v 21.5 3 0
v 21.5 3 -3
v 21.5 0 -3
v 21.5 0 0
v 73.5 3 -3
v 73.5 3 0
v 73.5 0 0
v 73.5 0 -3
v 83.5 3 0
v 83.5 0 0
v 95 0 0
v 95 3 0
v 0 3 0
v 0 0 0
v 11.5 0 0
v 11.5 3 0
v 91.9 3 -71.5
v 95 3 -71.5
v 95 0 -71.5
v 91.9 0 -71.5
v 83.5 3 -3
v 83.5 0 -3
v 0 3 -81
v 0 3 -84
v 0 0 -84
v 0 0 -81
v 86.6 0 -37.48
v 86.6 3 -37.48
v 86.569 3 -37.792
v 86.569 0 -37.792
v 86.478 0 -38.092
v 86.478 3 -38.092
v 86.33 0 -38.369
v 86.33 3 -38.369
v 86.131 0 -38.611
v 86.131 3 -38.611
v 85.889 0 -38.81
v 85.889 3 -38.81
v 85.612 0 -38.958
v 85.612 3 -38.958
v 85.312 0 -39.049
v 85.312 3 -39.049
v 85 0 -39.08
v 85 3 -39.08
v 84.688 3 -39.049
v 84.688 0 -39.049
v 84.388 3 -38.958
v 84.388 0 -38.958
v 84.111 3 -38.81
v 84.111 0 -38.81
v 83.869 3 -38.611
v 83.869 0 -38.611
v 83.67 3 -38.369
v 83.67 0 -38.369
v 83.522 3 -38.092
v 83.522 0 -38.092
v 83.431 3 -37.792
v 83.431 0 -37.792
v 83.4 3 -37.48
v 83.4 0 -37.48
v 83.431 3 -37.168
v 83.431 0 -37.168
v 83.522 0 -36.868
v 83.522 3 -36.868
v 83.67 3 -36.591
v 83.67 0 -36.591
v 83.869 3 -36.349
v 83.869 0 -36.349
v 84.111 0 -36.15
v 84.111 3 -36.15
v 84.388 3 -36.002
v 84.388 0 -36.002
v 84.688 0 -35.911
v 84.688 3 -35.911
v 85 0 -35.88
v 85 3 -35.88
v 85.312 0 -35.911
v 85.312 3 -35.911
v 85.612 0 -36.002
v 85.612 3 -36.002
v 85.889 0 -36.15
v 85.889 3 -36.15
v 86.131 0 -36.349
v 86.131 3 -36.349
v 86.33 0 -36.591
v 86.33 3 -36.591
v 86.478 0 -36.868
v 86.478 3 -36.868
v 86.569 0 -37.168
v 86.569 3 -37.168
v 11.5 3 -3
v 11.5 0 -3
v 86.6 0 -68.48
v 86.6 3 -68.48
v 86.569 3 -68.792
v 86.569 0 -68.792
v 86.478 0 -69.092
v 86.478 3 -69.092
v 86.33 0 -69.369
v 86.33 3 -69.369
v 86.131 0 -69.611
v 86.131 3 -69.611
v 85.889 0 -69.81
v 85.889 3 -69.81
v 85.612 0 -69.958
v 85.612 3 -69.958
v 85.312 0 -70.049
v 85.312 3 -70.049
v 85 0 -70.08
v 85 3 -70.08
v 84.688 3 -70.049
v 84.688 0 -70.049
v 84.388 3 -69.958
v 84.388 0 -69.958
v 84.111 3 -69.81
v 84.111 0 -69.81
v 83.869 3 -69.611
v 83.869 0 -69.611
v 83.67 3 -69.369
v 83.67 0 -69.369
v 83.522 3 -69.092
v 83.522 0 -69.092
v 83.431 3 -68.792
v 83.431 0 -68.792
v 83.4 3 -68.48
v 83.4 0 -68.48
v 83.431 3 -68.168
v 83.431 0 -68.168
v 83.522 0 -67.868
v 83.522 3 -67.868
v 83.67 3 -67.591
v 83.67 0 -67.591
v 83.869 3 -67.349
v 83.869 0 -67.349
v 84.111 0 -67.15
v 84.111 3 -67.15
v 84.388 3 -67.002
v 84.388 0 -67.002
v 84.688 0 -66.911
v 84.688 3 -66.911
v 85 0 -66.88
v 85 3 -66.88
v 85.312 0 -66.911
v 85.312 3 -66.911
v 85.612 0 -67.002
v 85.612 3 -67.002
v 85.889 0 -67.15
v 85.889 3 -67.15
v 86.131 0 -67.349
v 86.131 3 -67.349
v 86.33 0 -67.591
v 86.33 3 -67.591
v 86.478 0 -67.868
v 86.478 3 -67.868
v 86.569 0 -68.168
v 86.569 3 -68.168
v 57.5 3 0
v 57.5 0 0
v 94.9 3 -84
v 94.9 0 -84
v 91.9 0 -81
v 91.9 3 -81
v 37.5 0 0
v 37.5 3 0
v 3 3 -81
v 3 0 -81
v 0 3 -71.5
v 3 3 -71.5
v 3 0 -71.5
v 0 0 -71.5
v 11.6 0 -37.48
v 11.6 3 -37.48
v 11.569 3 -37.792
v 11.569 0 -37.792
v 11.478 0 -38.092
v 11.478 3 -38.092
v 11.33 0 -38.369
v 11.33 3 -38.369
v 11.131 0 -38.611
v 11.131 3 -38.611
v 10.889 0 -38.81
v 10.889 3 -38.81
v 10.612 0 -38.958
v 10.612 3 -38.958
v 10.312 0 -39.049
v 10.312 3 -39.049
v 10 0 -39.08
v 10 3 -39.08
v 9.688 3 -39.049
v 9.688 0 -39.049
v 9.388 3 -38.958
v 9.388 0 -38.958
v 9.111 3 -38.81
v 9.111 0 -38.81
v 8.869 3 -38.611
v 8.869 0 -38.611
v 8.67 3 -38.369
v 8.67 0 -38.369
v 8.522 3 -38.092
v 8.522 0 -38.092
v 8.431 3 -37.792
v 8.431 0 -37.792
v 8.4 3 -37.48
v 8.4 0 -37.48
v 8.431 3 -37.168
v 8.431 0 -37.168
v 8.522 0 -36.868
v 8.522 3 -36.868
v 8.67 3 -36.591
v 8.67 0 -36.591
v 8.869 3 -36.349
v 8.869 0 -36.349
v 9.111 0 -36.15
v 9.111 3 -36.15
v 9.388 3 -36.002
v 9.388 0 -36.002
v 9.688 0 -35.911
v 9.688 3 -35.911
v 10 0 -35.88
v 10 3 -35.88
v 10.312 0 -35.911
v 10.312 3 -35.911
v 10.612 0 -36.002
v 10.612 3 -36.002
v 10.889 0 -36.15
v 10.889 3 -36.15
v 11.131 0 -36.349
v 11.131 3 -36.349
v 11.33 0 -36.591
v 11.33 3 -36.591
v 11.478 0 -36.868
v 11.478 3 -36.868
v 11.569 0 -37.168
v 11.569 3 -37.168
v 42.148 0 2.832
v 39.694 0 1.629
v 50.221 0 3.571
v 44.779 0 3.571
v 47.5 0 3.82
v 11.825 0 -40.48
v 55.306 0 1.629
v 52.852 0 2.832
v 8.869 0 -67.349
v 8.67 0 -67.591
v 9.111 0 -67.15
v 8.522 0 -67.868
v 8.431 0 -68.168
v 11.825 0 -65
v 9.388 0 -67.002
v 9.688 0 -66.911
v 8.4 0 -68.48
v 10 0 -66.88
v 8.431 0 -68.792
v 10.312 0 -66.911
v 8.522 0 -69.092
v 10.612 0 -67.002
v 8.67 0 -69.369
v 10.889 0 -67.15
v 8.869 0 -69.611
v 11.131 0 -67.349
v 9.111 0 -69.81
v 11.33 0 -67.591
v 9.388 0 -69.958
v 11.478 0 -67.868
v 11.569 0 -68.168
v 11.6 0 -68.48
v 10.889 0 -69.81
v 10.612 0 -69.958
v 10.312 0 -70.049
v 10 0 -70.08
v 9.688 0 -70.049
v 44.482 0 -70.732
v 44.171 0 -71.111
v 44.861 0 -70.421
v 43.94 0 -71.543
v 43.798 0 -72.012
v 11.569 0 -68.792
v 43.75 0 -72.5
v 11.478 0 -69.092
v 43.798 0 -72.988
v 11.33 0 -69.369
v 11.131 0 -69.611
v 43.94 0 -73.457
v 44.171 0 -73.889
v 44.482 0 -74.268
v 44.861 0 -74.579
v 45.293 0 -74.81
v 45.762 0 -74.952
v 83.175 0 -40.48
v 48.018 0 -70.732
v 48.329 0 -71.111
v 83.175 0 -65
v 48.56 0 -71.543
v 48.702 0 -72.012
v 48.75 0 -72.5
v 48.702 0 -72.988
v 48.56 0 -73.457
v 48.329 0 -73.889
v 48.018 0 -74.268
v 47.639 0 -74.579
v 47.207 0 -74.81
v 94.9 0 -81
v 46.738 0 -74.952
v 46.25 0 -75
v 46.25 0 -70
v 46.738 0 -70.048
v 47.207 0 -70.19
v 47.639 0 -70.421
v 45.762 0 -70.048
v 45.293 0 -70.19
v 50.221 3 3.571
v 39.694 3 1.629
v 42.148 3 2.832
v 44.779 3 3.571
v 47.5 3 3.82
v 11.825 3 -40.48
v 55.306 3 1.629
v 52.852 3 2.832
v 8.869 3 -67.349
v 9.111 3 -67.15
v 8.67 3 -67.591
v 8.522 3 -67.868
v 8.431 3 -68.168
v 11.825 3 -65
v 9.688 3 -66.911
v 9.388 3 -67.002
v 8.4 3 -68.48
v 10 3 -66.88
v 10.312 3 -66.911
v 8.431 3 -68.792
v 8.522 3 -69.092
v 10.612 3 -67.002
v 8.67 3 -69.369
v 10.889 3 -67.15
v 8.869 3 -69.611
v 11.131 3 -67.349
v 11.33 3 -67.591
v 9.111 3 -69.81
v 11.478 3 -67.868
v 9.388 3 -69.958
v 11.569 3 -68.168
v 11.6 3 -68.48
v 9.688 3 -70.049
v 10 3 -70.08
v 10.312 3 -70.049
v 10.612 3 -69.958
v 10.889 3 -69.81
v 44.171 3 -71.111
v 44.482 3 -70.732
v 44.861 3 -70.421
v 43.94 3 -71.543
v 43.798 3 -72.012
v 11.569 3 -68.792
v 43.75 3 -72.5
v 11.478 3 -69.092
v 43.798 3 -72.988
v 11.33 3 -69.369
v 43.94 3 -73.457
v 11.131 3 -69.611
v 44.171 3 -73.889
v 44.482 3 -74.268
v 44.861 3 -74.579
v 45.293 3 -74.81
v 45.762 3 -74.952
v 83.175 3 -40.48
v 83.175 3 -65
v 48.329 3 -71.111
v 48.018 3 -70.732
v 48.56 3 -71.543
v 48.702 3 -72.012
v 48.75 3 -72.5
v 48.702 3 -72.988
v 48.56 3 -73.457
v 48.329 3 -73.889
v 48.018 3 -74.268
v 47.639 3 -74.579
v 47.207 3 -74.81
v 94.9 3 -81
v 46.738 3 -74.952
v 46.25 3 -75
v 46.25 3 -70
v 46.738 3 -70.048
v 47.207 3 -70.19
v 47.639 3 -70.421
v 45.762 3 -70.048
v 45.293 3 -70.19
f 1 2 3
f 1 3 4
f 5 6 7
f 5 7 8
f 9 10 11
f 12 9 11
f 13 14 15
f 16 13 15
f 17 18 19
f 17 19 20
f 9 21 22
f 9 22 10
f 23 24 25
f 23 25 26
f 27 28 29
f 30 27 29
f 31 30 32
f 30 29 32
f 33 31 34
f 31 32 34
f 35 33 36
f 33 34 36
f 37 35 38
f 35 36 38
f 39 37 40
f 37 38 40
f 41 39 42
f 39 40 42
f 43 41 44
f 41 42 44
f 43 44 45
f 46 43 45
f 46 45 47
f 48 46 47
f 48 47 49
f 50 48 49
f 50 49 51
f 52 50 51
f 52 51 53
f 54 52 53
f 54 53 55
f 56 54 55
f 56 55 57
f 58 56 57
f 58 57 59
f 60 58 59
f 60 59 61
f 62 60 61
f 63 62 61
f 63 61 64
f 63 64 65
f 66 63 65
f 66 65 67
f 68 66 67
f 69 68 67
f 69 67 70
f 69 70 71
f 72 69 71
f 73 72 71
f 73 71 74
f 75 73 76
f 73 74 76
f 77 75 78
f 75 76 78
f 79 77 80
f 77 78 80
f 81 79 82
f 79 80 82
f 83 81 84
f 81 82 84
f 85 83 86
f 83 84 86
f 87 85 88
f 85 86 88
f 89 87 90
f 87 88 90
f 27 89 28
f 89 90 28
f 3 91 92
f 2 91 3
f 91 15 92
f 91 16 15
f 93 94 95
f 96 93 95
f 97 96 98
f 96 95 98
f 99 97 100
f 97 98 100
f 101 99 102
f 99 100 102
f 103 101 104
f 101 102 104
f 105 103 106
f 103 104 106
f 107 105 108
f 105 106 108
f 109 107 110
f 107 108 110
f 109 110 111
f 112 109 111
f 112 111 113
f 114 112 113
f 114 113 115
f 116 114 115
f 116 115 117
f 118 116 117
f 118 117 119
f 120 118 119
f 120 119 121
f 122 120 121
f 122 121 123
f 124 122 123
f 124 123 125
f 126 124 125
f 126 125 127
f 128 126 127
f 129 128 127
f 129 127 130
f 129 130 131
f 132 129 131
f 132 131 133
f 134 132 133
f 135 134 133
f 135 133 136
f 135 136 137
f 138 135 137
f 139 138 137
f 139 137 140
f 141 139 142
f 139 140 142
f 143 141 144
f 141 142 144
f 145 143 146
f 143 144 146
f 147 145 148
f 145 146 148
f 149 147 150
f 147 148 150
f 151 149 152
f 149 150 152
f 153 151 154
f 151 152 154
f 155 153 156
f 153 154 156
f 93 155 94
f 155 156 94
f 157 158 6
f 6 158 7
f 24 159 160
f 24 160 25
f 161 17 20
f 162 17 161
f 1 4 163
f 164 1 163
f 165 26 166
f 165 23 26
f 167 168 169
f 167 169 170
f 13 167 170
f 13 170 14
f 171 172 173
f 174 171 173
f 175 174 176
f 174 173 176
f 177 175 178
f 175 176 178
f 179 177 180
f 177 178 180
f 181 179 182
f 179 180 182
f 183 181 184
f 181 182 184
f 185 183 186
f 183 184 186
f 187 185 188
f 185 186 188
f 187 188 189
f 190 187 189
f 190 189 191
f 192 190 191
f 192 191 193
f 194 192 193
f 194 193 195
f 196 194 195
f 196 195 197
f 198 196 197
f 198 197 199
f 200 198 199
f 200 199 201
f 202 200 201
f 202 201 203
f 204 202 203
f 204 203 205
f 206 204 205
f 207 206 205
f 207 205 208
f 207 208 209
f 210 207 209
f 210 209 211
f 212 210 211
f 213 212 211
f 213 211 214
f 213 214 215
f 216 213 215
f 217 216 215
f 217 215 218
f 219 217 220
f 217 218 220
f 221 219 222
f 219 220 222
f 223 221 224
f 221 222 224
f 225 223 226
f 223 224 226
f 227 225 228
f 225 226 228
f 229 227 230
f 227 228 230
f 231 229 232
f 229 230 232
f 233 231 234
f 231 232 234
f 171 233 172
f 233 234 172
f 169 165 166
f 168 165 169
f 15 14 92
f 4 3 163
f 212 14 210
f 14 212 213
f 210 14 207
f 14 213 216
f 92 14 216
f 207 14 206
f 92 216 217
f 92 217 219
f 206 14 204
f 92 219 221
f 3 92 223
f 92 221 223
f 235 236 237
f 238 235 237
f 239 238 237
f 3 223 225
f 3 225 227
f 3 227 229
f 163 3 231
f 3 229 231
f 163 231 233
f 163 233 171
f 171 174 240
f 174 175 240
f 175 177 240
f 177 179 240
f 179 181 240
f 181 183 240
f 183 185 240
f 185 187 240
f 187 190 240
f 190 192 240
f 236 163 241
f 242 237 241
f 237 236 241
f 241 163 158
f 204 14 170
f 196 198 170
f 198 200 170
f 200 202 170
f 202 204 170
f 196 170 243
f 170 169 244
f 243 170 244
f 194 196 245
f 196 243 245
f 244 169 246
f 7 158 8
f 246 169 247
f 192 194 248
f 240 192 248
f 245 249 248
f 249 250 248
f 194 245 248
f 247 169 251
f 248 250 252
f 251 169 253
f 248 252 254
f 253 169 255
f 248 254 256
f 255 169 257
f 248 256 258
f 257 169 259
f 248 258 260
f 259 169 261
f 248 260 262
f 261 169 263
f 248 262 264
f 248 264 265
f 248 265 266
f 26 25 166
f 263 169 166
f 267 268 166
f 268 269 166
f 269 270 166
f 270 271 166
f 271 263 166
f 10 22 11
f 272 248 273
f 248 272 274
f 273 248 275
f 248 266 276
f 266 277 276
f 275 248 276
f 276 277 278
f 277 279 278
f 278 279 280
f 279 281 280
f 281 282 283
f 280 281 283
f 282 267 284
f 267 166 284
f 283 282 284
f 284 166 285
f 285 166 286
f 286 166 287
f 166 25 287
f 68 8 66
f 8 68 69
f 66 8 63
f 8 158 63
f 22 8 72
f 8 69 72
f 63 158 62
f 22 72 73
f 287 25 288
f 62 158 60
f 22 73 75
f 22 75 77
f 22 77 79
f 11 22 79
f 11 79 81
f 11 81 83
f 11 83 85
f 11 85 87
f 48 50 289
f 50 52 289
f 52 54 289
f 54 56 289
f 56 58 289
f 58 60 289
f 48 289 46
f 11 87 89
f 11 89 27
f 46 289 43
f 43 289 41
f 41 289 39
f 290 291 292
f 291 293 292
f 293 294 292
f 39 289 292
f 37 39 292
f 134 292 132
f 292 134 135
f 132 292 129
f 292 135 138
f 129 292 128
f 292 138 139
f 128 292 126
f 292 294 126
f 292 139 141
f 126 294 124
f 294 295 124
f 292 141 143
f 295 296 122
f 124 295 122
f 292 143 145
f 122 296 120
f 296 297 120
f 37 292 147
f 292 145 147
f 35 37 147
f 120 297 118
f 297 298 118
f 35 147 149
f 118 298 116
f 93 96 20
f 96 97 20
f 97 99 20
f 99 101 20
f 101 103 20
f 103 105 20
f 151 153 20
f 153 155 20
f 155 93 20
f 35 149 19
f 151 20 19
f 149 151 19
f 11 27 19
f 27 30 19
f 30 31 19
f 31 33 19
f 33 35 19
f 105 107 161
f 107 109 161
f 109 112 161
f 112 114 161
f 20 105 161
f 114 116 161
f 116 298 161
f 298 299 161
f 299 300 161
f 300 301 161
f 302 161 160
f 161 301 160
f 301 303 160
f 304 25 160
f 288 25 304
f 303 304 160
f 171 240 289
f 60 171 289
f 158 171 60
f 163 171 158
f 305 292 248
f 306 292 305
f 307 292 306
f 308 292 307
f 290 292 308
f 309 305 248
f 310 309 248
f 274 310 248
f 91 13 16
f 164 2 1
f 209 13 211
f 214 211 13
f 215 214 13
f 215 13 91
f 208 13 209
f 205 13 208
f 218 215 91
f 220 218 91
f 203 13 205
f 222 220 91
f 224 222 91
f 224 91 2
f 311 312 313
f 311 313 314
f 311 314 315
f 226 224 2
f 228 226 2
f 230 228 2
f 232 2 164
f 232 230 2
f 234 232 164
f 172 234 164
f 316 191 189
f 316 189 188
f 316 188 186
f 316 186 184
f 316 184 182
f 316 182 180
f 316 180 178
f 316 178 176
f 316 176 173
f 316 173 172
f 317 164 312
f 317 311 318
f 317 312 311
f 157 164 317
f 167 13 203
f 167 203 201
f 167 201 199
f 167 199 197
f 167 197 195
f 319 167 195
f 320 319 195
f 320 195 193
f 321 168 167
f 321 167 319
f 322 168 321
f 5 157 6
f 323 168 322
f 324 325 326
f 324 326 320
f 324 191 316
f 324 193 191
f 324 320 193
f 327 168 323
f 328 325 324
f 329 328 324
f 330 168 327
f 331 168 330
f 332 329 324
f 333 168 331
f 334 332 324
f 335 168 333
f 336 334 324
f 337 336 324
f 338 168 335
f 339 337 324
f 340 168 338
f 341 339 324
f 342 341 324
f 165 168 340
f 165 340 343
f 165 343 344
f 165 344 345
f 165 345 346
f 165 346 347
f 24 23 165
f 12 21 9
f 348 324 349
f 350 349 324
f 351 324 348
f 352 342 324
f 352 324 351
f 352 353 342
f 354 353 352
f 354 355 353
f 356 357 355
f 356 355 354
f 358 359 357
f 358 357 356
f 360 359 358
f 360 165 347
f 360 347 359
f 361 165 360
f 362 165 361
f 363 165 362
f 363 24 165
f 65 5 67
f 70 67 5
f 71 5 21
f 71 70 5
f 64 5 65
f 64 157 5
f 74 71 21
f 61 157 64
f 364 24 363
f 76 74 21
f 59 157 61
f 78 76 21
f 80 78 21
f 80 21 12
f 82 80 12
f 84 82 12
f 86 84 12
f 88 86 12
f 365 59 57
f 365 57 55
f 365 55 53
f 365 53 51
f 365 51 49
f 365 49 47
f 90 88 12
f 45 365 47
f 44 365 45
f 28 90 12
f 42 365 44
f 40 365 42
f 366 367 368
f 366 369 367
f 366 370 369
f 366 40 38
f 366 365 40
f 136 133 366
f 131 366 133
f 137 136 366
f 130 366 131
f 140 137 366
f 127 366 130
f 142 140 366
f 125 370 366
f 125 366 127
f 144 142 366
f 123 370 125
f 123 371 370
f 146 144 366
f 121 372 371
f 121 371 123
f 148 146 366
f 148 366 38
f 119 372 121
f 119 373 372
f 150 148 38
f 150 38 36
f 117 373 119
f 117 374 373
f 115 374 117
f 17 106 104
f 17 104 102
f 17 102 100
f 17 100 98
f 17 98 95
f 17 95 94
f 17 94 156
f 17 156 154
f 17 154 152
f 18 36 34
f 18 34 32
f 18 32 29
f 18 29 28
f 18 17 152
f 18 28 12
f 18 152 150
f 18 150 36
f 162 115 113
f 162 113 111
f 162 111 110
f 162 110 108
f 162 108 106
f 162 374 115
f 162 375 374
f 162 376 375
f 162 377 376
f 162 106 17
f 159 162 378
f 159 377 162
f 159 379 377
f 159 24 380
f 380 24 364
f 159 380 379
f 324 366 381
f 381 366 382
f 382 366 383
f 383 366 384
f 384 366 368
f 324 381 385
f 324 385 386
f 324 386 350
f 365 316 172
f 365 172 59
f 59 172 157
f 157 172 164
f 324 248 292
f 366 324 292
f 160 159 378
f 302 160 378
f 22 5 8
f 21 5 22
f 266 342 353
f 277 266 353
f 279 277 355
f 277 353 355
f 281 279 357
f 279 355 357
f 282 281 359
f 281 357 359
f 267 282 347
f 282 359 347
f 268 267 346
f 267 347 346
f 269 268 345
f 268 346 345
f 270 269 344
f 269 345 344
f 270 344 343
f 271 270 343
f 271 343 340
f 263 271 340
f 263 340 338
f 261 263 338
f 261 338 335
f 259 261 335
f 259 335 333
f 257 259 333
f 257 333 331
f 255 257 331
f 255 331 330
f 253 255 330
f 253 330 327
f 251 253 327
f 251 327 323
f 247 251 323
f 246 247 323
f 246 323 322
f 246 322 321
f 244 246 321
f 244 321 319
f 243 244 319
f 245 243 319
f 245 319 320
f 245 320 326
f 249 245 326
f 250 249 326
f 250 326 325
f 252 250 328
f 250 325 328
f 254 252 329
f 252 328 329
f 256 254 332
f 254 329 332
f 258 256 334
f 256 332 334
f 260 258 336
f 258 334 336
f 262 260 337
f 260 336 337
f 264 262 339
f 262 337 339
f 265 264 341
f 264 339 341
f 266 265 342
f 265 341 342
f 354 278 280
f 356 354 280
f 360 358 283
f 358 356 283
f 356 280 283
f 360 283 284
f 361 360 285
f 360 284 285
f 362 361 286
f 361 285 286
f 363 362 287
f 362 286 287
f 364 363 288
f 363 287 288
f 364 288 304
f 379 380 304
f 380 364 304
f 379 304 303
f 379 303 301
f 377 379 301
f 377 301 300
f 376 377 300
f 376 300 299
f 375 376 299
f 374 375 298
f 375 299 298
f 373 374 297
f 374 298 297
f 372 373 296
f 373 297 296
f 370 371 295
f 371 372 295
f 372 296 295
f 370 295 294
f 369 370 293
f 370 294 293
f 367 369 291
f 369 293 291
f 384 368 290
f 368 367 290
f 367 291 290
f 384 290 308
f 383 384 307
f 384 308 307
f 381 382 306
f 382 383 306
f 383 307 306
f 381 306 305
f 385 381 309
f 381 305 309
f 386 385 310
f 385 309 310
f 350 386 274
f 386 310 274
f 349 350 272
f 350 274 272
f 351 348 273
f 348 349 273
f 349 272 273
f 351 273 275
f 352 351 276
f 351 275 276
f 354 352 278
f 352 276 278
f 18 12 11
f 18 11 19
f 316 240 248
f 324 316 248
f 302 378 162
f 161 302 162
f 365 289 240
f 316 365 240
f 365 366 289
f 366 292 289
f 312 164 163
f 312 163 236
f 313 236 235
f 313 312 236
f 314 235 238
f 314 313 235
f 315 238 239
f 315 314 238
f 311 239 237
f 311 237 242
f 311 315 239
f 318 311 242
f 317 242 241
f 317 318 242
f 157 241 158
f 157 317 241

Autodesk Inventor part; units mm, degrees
ref_plane "YZ Plane" through (0, 0, 0) normal (1, 0, 0) x (0, 1, 0)
ref_plane "XZ Plane" through (0, 0, 0) normal (0, 1, 0) x (-1, 0, 0)
ref_plane "XY Plane" through (0, 0, 0) normal (0, 0, 1) x (1, 0, 0)
sketch "Esboço3" plane through (0, 0, 0) normal (0, 1, 0) x (-1, 0, 0)
  line L0 (0, 0) -> (-95, 0)
  line L1 (-95, 0) -> (-95, -80)
  line L2 (-95, -80) -> (0, -80)
  line L3 (0, -80) -> (0, 0)
  line L4 (-11.825, -65) -> (-83.175, -65)
  line L5 (-83.175, -65) -> (-83.175, -40.48)
  line L6 (-83.175, -40.48) -> (-11.825, -40.48)
  line L7 (-11.825, -40.48) -> (-11.825, -65)
  circle A0 centre (-46.25, -72.5) radius 2.5
  point P0 (-47.5, -40.48)
  dimension "d4" = 95
  dimension "d5" = 80
  dimension "d9" = 71.35
  dimension "d10" = 24.52
  dimension "d11" = 11.825
  dimension "d17" = 5
  dimension "d56" = 15
  dimension "d140" = 11.825
  dimension "d251" = 40.48
  dimension "d259" = 7.5
extrude "Extrusão2" add sketch "Esboço3" along normal blind 3
sketch "Esboço7" plane through (0, 3, 0) normal (0, 1, 0) x (1, 0, 0)
  line L0 (10, 68.48) -> (85, 68.48)
  line L1 (85, 68.48) -> (85, 37.48)
  line L2 (85, 37.48) -> (10, 37.48)
  line L3 (10, 37.48) -> (10, 68.48)
  line L4 (11.825, 40.48) -> (11.825, 65) projected
  line L5 (83.175, 65) -> (83.175, 40.48) projected
  line L6 (11.825, 65) -> (83.175, 65) projected
  line L7 (83.175, 40.48) -> (11.825, 40.48) projected
  circle A0 centre (10, 37.48) radius 1.6
  circle A1 centre (10, 68.48) radius 1.6
  circle A2 centre (85, 68.48) radius 1.6
  circle A3 centre (85, 37.48) radius 1.6
  point P0 (0, 0)
  dimension "d57" = 75
  dimension "d58" = 31
  dimension "d59" = 1.825
  dimension "d60" = 73.175
  dimension "d62" = 1.825
  dimension "d65" = 3.2
  dimension "d66" = 3.2
  dimension "d67" = 3.2
  dimension "d68" = 3.2
  dimension "d69" = 3
extrude "Extrusão4" cut sketch "Esboço7" against normal blind 3 contours L3 A1 L0 | L0 A1 L3 | A2 L1 L0 | L0 L1 A2 | A0 L2 L3 | L3 L2 A0 | A3 L2 L1 | L1 L2 A3
sketch "Esboço19" plane through (0, 3, 0) normal (0, 1, 0) x (1, 0, 0)
  line L0 (0, 0) -> (95, 0) projected
  arc A0 (37.5, 0) -> (57.5, 0) centre (47.5, 11.1803) ccw
  dimension "d189" = 20
  dimension "d190" = 15
  dimension "d191" = 37.5
extrude "Extrusão14" add sketch "Esboço19" against normal blind 3
sketch "Esboço23" plane through (0, 3, 0) normal (0, 1, 0) x (1, 0, 0)
  line L0 (0, 80) -> (0, 0) projected
  line L1 (0, 80) -> (95, 80)
  line L2 (95, 80) -> (95, 84)
  line L3 (95, 84) -> (0, 84)
  line L4 (0, 84) -> (0, 80)
  dimension "d208" = 4
extrude "Extrusão17" add sketch "Esboço23" against normal blind 3
sketch "Esboço24" plane through (0, 3, 0) normal (0, 1, 0) x (1, 0, 0)
  line L0 (95, 0) -> (95, 84) projected
  line L1 (95, 71.5) -> (91.9, 71.5)
  line L2 (91.9, 71.5) -> (91.9, 84)
  line L3 (91.9, 84) -> (95, 84)
  line L4 (95, 84) -> (95, 71.5)
  line L5 (95, 84) -> (0, 84) projected
  point P0 (0, 0)
  point P1 (93.45, 84)
  dimension "d211" = 3.1
  dimension "d212" = 12.5
  dimension "d213" = 0
extrude "Extrusão18" cut sketch "Esboço24" against normal blind 3
sketch "Esboço27" plane through (0, 3, 0) normal (0, 1, 0) x (1, 0, 0)
  line L0 (91.9, 84) -> (0, 84) projected
  line L1 (0, 84) -> (3, 84)
  line L2 (3, 84) -> (3, 71.5)
  line L3 (3, 71.5) -> (0, 71.5)
  line L4 (0, 71.5) -> (0, 84)
  point P0 (0, 0)
  dimension "d226" = 3
  dimension "d227" = 12.5
extrude "Extrusão21" cut sketch "Esboço27" against normal blind 3
sketch "Esboço29" plane through (0, 3, 0) normal (0, 1, 0) x (1, 0, 0)
  line L0 (57.5, 0) -> (95, 0) projected
  line L1 (83.5, 0) -> (73.5, 0)
  line L2 (73.5, 0) -> (73.5, 3)
  line L3 (73.5, 3) -> (83.5, 3)
  line L4 (83.5, 3) -> (83.5, 0)
  line L5 (21.5, 0) -> (11.5, 0)
  line L6 (11.5, 0) -> (11.5, 3)
  line L7 (11.5, 3) -> (21.5, 3)
  line L8 (21.5, 3) -> (21.5, 0)
  line L9 (0, 71.5) -> (0, 0) projected
  line L10 (95, 0) -> (95, 71.5) projected
  point P0 (11.5, 1.5)
  point P1 (83.5, 1.5)
  dimension "d241" = 10
  dimension "d242" = 3
  dimension "d243" = 10
  dimension "d244" = 3
  dimension "d245" = 11.5
  dimension "d246" = 11.5
extrude "Extrusão23" cut sketch "Esboço29" against normal blind 3
sketch "Esboço30" plane through (0, 3, 0) normal (0, 1, 0) x (1, 0, 0)
  line L0 (91.9, 71.5) -> (91.9, 84) projected
  line L1 (91.9, 84) -> (94.9, 84)
  line L2 (94.9, 84) -> (94.9, 81)
  line L3 (94.9, 81) -> (91.9, 81)
  line L4 (91.9, 81) -> (91.9, 84)
  line L5 (3, 71.5) -> (3, 84) projected
  line L6 (3, 84) -> (0, 84)
  line L7 (0, 84) -> (0, 81)
  line L8 (0, 81) -> (3, 81)
  line L9 (3, 81) -> (3, 84)
  point P0 (0, 0)
  dimension "d253" = 3
  dimension "d254" = 3
  dimension "d255" = 3
  dimension "d256" = 3
extrude "Extrusão24" add sketch "Esboço30" against normal blind 3
properties part number "Tampa"
